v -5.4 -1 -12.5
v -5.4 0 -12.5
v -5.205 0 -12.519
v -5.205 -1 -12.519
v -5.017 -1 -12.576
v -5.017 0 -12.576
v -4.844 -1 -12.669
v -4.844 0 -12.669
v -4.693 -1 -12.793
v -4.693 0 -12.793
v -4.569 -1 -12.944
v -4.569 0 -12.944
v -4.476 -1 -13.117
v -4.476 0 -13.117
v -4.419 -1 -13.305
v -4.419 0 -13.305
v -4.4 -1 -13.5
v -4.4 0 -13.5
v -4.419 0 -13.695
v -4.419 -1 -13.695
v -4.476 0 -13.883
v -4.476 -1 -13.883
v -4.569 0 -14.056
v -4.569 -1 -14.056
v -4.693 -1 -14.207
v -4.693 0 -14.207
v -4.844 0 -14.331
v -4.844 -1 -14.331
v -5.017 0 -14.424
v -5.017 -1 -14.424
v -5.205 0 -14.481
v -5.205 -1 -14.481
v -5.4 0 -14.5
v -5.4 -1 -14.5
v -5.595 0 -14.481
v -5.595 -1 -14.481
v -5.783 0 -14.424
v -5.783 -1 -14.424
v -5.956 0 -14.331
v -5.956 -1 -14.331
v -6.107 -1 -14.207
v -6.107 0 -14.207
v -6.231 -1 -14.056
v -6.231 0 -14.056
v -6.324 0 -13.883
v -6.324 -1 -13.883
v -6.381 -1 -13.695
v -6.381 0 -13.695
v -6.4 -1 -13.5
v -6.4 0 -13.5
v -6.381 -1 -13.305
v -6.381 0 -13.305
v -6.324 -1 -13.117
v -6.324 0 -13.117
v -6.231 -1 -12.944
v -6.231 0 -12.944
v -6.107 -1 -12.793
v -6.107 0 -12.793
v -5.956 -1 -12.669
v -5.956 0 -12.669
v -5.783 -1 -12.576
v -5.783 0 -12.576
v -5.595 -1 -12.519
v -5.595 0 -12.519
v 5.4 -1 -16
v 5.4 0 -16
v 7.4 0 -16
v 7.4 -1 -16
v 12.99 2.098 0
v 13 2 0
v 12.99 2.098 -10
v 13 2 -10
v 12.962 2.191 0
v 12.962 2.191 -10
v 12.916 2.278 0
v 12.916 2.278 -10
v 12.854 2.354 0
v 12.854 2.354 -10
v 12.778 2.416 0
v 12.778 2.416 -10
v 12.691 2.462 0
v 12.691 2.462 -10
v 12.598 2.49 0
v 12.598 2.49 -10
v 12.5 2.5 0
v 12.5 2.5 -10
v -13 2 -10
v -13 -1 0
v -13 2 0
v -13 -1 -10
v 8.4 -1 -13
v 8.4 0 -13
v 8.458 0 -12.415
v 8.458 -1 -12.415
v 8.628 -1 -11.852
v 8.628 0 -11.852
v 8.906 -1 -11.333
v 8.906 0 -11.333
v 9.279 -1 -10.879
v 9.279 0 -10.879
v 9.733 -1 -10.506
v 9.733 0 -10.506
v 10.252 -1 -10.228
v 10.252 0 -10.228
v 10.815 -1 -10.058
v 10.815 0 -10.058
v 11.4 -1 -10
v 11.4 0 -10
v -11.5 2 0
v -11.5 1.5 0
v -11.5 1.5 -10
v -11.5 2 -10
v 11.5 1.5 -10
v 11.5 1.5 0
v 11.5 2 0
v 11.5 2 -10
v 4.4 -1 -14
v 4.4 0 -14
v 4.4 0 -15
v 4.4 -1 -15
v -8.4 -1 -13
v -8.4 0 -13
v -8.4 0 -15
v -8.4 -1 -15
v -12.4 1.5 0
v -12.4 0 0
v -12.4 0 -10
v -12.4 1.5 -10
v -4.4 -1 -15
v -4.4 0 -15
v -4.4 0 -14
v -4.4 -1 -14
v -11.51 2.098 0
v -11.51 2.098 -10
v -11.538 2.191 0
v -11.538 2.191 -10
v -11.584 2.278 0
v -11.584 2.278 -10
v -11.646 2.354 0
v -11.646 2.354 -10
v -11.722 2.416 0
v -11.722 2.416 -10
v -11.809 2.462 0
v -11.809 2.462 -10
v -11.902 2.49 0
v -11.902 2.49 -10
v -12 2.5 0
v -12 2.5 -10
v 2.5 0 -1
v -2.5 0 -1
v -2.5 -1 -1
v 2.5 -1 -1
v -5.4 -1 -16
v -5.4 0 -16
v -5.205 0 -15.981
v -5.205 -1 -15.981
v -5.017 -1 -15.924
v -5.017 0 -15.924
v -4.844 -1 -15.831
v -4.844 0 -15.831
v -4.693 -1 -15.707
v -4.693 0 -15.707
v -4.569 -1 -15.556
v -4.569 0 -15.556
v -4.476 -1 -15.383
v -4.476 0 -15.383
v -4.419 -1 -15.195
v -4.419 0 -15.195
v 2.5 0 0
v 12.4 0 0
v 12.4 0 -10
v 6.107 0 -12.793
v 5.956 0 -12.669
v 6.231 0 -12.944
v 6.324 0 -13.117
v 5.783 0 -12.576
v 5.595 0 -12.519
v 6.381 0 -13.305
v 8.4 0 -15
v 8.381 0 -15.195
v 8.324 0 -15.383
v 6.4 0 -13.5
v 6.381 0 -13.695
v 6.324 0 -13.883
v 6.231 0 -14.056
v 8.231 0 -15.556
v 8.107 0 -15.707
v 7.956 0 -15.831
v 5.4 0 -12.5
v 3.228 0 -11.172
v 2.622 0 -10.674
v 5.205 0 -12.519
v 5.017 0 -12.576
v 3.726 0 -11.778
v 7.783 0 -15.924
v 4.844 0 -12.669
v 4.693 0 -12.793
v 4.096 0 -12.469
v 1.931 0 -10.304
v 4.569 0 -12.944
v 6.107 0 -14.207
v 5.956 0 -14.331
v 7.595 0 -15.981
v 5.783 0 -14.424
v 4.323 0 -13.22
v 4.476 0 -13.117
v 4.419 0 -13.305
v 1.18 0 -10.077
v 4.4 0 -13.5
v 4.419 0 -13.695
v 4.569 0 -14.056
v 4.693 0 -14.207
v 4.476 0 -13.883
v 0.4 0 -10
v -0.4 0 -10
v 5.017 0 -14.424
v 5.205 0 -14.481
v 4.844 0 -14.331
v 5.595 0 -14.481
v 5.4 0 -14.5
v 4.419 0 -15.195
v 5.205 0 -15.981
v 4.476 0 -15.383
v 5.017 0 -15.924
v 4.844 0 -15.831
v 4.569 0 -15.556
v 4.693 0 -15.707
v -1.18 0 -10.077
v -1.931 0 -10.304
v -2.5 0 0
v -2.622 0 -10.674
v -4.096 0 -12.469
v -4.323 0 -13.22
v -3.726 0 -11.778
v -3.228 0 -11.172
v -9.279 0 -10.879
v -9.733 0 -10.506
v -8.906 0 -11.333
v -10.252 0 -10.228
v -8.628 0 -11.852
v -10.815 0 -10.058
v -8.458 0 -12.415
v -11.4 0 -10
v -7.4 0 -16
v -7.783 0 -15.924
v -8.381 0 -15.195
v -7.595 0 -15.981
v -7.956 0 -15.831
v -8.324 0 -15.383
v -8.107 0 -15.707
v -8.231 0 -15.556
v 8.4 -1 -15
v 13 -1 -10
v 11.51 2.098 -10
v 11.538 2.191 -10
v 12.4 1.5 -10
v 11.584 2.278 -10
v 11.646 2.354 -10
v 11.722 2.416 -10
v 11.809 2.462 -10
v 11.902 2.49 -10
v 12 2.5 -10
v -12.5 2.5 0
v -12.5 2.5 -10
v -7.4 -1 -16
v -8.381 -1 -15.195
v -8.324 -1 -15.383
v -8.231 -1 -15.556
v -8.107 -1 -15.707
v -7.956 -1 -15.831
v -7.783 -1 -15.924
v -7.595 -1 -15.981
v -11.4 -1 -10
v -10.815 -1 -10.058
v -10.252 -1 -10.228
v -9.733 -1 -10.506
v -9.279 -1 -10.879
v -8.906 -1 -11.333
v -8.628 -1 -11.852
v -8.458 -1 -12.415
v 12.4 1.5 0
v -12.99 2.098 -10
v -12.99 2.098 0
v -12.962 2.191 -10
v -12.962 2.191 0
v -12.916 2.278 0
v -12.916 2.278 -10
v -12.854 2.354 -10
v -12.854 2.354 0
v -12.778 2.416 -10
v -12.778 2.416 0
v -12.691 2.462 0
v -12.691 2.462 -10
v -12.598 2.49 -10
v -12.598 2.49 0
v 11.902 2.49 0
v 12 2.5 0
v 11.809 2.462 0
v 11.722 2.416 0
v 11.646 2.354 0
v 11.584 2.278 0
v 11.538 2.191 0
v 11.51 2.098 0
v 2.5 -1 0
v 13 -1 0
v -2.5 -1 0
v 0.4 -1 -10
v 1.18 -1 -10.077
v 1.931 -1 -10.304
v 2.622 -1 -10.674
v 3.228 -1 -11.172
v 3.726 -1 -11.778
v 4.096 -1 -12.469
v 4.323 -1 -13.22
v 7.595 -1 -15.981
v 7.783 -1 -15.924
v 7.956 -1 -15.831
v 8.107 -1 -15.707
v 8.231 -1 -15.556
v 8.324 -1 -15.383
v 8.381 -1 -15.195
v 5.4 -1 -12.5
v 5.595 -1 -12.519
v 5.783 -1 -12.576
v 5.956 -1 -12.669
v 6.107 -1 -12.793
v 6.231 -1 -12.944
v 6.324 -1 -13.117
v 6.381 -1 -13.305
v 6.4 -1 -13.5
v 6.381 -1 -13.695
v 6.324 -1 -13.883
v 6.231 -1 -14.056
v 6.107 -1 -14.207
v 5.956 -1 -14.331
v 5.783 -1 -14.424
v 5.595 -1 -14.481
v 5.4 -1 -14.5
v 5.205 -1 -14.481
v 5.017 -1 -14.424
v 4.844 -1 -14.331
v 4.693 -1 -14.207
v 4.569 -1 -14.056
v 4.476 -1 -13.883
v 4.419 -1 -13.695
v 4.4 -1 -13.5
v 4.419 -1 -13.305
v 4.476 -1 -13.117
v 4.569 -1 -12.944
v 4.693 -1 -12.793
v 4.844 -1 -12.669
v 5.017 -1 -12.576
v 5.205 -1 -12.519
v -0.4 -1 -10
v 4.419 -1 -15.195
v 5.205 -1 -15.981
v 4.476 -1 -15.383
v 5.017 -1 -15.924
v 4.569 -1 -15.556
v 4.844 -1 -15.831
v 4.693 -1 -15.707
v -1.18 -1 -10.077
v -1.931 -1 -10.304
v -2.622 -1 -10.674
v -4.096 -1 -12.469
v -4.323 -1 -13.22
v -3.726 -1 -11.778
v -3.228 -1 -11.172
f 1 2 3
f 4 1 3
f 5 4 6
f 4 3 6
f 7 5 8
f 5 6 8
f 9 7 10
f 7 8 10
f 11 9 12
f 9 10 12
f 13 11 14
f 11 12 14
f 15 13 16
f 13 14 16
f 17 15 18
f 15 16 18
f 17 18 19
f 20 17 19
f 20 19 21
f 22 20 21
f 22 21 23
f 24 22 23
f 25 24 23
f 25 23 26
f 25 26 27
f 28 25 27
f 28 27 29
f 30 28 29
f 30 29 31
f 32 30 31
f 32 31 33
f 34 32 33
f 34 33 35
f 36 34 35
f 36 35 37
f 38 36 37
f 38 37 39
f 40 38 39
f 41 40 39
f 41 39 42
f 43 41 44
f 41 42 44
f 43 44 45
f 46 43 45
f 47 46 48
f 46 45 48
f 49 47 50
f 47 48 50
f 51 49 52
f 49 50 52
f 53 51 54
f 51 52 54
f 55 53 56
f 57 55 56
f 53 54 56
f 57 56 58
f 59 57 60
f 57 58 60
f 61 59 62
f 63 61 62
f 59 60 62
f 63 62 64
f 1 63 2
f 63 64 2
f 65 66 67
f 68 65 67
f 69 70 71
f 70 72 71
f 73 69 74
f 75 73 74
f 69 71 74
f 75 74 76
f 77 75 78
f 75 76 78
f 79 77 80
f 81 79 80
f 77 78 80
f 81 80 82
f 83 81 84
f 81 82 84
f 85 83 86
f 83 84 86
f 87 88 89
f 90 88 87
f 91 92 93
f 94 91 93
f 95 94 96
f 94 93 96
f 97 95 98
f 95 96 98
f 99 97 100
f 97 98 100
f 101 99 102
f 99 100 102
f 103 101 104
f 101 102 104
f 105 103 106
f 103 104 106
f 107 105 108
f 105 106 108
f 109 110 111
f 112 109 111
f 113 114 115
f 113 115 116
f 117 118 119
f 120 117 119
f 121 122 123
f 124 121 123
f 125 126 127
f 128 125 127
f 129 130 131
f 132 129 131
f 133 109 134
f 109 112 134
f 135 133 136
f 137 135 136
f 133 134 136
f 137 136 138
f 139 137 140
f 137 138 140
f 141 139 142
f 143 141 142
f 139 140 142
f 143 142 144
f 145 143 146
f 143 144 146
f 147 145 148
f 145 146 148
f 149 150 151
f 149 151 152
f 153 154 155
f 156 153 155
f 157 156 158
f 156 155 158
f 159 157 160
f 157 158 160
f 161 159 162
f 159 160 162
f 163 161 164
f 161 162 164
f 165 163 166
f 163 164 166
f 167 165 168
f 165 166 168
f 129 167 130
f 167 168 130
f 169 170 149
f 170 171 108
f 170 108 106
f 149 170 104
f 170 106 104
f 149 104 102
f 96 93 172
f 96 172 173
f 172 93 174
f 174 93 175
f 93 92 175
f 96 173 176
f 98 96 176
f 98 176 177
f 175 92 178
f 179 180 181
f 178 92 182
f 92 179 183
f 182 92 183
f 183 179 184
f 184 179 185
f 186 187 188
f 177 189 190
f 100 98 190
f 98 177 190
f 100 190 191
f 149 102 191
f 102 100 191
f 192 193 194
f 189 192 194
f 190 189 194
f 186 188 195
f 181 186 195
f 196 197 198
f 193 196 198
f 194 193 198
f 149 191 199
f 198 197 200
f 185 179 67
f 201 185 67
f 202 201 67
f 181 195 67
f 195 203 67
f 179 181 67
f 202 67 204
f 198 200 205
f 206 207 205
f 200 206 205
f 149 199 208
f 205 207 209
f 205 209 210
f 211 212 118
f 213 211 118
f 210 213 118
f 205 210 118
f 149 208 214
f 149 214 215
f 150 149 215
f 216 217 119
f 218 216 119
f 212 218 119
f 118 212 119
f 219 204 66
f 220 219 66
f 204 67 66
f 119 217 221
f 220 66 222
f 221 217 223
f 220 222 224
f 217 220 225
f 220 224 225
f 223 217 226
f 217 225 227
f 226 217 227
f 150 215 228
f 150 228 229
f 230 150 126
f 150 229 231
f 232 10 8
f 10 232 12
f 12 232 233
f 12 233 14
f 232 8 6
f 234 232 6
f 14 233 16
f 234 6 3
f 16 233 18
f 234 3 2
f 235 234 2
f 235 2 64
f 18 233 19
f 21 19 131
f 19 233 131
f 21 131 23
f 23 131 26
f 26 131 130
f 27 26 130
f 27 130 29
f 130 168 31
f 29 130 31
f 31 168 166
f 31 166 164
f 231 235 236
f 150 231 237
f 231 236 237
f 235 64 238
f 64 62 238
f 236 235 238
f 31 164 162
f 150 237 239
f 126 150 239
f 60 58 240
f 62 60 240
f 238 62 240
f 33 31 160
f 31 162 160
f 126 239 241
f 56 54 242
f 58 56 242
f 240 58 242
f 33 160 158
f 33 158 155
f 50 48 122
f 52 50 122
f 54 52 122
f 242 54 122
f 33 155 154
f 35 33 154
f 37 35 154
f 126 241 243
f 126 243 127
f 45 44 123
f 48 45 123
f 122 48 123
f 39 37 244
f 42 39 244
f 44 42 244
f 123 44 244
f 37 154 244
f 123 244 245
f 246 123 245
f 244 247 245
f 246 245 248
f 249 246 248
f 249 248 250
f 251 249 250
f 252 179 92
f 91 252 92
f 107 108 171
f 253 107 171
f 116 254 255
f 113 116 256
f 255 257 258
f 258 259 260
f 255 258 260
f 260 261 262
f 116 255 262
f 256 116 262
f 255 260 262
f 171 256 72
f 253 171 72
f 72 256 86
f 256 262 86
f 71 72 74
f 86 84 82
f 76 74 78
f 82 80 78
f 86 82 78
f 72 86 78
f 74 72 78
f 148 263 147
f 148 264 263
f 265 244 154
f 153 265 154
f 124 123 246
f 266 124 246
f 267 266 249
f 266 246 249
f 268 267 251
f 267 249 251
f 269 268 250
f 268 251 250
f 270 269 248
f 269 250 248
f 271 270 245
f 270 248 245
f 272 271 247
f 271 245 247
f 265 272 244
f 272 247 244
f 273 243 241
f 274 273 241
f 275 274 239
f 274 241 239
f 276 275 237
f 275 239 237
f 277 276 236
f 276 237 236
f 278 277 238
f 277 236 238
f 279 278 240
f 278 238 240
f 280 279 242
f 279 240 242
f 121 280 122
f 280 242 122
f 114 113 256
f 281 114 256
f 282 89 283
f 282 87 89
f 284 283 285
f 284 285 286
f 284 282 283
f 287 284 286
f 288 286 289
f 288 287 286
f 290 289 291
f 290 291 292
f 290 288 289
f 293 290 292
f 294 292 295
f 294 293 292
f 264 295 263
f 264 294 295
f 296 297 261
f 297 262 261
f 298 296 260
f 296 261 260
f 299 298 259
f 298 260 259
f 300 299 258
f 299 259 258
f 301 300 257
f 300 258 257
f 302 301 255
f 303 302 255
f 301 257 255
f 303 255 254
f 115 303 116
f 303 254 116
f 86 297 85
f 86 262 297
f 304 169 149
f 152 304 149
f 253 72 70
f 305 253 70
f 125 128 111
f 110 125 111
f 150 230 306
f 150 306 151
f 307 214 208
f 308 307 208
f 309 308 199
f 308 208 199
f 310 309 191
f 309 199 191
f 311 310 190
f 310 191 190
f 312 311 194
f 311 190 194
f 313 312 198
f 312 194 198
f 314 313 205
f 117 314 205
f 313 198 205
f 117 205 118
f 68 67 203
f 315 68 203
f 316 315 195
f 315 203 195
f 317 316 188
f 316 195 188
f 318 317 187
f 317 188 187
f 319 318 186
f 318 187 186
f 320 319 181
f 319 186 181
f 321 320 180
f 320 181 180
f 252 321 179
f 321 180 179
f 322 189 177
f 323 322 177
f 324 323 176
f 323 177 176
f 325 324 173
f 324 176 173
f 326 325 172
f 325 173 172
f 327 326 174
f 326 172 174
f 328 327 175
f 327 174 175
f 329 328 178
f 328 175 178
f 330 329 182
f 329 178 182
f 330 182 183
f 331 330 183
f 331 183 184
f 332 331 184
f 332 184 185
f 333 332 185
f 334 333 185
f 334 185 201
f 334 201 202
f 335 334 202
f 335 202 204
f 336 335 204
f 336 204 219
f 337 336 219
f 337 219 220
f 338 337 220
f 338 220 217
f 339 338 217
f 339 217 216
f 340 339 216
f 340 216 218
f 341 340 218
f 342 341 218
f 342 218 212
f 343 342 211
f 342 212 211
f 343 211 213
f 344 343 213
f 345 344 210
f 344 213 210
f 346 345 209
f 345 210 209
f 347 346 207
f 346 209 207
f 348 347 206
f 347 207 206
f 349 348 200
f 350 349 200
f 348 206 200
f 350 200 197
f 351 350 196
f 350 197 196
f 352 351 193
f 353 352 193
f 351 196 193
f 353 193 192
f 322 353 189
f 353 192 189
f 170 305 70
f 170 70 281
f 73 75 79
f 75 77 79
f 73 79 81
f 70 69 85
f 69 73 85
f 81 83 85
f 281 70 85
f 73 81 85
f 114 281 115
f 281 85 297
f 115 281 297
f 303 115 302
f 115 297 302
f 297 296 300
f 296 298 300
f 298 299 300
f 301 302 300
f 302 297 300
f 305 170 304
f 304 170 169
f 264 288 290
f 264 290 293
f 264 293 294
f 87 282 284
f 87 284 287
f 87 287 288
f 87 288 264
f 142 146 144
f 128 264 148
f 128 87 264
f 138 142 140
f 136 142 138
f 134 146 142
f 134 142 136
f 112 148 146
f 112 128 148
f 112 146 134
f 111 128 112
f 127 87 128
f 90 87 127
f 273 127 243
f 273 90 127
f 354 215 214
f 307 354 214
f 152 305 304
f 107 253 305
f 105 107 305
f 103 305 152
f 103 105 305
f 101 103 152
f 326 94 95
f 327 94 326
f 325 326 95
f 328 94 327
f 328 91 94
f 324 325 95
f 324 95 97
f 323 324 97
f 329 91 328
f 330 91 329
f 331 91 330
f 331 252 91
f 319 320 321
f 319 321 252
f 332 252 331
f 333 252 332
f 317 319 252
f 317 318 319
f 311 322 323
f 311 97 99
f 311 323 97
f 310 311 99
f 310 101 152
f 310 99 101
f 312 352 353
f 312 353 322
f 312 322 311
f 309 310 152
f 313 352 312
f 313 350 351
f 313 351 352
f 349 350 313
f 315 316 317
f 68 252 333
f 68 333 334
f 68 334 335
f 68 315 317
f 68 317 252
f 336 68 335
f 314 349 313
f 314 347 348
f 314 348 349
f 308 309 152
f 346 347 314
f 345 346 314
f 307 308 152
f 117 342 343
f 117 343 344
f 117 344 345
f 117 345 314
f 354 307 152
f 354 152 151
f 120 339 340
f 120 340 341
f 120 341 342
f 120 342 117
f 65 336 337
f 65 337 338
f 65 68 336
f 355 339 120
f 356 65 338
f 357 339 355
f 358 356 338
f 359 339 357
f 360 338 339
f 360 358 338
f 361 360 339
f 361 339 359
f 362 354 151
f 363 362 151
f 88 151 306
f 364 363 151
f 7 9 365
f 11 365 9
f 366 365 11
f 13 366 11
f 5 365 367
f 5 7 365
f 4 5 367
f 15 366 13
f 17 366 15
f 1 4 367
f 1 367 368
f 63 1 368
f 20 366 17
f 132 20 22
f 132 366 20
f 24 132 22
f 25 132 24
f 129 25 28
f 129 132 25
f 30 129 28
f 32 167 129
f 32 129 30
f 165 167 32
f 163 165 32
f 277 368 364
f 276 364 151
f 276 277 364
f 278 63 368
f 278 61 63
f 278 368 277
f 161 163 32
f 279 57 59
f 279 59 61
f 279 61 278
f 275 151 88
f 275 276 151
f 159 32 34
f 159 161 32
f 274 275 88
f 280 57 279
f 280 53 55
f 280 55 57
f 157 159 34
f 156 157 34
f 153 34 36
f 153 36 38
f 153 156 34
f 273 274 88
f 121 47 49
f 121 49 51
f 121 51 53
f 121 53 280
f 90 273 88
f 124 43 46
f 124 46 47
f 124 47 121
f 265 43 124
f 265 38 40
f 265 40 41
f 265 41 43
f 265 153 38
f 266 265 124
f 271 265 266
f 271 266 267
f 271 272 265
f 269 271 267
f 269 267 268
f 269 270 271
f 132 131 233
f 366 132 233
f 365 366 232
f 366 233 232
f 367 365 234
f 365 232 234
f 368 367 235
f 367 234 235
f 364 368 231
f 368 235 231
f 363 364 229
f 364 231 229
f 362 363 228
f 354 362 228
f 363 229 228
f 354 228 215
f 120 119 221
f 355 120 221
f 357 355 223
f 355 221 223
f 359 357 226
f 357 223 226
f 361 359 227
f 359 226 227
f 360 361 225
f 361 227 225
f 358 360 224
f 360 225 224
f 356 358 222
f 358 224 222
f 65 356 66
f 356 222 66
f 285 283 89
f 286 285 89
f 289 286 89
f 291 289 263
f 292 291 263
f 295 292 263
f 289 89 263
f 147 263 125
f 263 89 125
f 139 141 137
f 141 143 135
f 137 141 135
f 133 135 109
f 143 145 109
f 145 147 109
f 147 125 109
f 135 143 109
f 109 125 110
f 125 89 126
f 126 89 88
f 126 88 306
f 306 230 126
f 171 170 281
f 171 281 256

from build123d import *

# Parameters (mm, degrees)
EXTRUDE_1_DEPTH     = 1
SKETCH_3_R          = 1
CUT_EXTRUDE_3_DEPTH = 21.639767441
SKETCH_6_W          = 5
SKETCH_6_H          = 2
CUT_EXTRUDE_4_DEPTH = 21.639767441
SKETCH_7_W          = 0.6
SKETCH_7_H          = 10
EXTRUDE_2_DEPTH     = 1.5
SKETCH_8_W          = 1.5
SKETCH_8_H          = 10
EXTRUDE_3_DEPTH     = 1
FILLET_1_R          = 0.5


with BuildPart() as part:
    # Эскиз1 → Бобышка-Вытянуть1 (new body)
    with BuildSketch(Plane(origin=(0, 0, 0), x_dir=(1, 0, 0), z_dir=(0, 1, 0))):
        with BuildLine():
            Line((-7.4, 16), (-5.4, 16))
            ThreePointArc((-5.4, 16), (-4.692893219, 15.707106781), (-4.4, 15))
            Line((-4.4, 15), (-4.4, 14))
            ThreePointArc((-4.4, 14), (-3.228427125, 11.171572875), (-0.4, 10))
            Line((-0.4, 10), (0.4, 10))
            ThreePointArc((0.4, 10), (3.228427125, 11.171572875), (4.4, 14))
            Line((4.4, 14), (4.4, 15))
            ThreePointArc((4.4, 15), (4.692893219, 15.707106781), (5.4, 16))
            Line((5.4, 16), (7.4, 16))
            ThreePointArc((7.4, 16), (8.107106781, 15.707106781), (8.4, 15))
            Line((8.4, 15), (8.4, 13))
            ThreePointArc((8.4, 13), (9.278679656, 10.878679656), (11.4, 10))
            Line((11.4, 10), (13, 10))
            Line((13, 10), (13, 0))
            Line((13, 0), (-13, 0))
            Line((-13, 0), (-13, 10))
            Line((-13, 10), (-11.4, 10))
            ThreePointArc((-11.4, 10), (-9.278679656, 10.878679656), (-8.4, 13))
            Line((-8.4, 13), (-8.4, 15))
            ThreePointArc((-8.4, 15), (-8.107106781, 15.707106781), (-7.4, 16))
        make_face()
    extrude(amount=-EXTRUDE_1_DEPTH)

    # Эскиз3 → Вырез-Вытянуть3 (cut, through all)
    with BuildSketch(Plane(origin=(0, 0, 0), x_dir=(1, 0, 0), z_dir=(0, 1, 0))):
        with Locations(Location((-5.4, 13.5, 0), (0, 0, 270))):
            Circle(SKETCH_3_R)
        with Locations(Location((5.4, 13.5, 0), (0, 0, 270))):
            Circle(SKETCH_3_R)
    extrude(amount=-CUT_EXTRUDE_3_DEPTH, mode=Mode.SUBTRACT)

    # Эскиз6 → Вырез-Вытянуть4 (cut, through all)
    with BuildSketch(Plane(origin=(0, 0, 0), x_dir=(1, 0, 0), z_dir=(0, 1, 0))):
        Rectangle(SKETCH_6_W, SKETCH_6_H)
    extrude(amount=-CUT_EXTRUDE_4_DEPTH, mode=Mode.SUBTRACT)

    # Эскиз7 → Бобышка-Вытянуть2 (add)
    with BuildSketch(Plane(origin=(0, 0, 0), x_dir=(1, 0, 0), z_dir=(0, 1, 0))):
        with Locations((-12.7, 5)):
            Rectangle(SKETCH_7_W, SKETCH_7_H)
        with Locations((12.7, 5)):
            Rectangle(SKETCH_7_W, SKETCH_7_H)
    extrude(amount=EXTRUDE_2_DEPTH)

    # Эскиз8 → Бобышка-Вытянуть3 (add)
    with BuildSketch(Plane(origin=(0, 1.5, 0), x_dir=(1, 0, 0), z_dir=(0, 1, 0))):
        with Locations((-12.25, 5)):
            Rectangle(SKETCH_8_W, SKETCH_8_H)
        with Locations((12.25, 5)):
            Rectangle(SKETCH_8_W, SKETCH_8_H)
    extrude(amount=EXTRUDE_3_DEPTH)

    # Скругление1
    fillet_1_edges = [part.edges().sort_by_distance(p)[0] for p in [
        (-13, 2.5, -5),
        (-11.5, 2.5, -5),
        (13, 2.5, -5),
        (11.5, 2.5, -5),
    ]]
    fillet(fillet_1_edges, radius=FILLET_1_R)


solid = part.part
